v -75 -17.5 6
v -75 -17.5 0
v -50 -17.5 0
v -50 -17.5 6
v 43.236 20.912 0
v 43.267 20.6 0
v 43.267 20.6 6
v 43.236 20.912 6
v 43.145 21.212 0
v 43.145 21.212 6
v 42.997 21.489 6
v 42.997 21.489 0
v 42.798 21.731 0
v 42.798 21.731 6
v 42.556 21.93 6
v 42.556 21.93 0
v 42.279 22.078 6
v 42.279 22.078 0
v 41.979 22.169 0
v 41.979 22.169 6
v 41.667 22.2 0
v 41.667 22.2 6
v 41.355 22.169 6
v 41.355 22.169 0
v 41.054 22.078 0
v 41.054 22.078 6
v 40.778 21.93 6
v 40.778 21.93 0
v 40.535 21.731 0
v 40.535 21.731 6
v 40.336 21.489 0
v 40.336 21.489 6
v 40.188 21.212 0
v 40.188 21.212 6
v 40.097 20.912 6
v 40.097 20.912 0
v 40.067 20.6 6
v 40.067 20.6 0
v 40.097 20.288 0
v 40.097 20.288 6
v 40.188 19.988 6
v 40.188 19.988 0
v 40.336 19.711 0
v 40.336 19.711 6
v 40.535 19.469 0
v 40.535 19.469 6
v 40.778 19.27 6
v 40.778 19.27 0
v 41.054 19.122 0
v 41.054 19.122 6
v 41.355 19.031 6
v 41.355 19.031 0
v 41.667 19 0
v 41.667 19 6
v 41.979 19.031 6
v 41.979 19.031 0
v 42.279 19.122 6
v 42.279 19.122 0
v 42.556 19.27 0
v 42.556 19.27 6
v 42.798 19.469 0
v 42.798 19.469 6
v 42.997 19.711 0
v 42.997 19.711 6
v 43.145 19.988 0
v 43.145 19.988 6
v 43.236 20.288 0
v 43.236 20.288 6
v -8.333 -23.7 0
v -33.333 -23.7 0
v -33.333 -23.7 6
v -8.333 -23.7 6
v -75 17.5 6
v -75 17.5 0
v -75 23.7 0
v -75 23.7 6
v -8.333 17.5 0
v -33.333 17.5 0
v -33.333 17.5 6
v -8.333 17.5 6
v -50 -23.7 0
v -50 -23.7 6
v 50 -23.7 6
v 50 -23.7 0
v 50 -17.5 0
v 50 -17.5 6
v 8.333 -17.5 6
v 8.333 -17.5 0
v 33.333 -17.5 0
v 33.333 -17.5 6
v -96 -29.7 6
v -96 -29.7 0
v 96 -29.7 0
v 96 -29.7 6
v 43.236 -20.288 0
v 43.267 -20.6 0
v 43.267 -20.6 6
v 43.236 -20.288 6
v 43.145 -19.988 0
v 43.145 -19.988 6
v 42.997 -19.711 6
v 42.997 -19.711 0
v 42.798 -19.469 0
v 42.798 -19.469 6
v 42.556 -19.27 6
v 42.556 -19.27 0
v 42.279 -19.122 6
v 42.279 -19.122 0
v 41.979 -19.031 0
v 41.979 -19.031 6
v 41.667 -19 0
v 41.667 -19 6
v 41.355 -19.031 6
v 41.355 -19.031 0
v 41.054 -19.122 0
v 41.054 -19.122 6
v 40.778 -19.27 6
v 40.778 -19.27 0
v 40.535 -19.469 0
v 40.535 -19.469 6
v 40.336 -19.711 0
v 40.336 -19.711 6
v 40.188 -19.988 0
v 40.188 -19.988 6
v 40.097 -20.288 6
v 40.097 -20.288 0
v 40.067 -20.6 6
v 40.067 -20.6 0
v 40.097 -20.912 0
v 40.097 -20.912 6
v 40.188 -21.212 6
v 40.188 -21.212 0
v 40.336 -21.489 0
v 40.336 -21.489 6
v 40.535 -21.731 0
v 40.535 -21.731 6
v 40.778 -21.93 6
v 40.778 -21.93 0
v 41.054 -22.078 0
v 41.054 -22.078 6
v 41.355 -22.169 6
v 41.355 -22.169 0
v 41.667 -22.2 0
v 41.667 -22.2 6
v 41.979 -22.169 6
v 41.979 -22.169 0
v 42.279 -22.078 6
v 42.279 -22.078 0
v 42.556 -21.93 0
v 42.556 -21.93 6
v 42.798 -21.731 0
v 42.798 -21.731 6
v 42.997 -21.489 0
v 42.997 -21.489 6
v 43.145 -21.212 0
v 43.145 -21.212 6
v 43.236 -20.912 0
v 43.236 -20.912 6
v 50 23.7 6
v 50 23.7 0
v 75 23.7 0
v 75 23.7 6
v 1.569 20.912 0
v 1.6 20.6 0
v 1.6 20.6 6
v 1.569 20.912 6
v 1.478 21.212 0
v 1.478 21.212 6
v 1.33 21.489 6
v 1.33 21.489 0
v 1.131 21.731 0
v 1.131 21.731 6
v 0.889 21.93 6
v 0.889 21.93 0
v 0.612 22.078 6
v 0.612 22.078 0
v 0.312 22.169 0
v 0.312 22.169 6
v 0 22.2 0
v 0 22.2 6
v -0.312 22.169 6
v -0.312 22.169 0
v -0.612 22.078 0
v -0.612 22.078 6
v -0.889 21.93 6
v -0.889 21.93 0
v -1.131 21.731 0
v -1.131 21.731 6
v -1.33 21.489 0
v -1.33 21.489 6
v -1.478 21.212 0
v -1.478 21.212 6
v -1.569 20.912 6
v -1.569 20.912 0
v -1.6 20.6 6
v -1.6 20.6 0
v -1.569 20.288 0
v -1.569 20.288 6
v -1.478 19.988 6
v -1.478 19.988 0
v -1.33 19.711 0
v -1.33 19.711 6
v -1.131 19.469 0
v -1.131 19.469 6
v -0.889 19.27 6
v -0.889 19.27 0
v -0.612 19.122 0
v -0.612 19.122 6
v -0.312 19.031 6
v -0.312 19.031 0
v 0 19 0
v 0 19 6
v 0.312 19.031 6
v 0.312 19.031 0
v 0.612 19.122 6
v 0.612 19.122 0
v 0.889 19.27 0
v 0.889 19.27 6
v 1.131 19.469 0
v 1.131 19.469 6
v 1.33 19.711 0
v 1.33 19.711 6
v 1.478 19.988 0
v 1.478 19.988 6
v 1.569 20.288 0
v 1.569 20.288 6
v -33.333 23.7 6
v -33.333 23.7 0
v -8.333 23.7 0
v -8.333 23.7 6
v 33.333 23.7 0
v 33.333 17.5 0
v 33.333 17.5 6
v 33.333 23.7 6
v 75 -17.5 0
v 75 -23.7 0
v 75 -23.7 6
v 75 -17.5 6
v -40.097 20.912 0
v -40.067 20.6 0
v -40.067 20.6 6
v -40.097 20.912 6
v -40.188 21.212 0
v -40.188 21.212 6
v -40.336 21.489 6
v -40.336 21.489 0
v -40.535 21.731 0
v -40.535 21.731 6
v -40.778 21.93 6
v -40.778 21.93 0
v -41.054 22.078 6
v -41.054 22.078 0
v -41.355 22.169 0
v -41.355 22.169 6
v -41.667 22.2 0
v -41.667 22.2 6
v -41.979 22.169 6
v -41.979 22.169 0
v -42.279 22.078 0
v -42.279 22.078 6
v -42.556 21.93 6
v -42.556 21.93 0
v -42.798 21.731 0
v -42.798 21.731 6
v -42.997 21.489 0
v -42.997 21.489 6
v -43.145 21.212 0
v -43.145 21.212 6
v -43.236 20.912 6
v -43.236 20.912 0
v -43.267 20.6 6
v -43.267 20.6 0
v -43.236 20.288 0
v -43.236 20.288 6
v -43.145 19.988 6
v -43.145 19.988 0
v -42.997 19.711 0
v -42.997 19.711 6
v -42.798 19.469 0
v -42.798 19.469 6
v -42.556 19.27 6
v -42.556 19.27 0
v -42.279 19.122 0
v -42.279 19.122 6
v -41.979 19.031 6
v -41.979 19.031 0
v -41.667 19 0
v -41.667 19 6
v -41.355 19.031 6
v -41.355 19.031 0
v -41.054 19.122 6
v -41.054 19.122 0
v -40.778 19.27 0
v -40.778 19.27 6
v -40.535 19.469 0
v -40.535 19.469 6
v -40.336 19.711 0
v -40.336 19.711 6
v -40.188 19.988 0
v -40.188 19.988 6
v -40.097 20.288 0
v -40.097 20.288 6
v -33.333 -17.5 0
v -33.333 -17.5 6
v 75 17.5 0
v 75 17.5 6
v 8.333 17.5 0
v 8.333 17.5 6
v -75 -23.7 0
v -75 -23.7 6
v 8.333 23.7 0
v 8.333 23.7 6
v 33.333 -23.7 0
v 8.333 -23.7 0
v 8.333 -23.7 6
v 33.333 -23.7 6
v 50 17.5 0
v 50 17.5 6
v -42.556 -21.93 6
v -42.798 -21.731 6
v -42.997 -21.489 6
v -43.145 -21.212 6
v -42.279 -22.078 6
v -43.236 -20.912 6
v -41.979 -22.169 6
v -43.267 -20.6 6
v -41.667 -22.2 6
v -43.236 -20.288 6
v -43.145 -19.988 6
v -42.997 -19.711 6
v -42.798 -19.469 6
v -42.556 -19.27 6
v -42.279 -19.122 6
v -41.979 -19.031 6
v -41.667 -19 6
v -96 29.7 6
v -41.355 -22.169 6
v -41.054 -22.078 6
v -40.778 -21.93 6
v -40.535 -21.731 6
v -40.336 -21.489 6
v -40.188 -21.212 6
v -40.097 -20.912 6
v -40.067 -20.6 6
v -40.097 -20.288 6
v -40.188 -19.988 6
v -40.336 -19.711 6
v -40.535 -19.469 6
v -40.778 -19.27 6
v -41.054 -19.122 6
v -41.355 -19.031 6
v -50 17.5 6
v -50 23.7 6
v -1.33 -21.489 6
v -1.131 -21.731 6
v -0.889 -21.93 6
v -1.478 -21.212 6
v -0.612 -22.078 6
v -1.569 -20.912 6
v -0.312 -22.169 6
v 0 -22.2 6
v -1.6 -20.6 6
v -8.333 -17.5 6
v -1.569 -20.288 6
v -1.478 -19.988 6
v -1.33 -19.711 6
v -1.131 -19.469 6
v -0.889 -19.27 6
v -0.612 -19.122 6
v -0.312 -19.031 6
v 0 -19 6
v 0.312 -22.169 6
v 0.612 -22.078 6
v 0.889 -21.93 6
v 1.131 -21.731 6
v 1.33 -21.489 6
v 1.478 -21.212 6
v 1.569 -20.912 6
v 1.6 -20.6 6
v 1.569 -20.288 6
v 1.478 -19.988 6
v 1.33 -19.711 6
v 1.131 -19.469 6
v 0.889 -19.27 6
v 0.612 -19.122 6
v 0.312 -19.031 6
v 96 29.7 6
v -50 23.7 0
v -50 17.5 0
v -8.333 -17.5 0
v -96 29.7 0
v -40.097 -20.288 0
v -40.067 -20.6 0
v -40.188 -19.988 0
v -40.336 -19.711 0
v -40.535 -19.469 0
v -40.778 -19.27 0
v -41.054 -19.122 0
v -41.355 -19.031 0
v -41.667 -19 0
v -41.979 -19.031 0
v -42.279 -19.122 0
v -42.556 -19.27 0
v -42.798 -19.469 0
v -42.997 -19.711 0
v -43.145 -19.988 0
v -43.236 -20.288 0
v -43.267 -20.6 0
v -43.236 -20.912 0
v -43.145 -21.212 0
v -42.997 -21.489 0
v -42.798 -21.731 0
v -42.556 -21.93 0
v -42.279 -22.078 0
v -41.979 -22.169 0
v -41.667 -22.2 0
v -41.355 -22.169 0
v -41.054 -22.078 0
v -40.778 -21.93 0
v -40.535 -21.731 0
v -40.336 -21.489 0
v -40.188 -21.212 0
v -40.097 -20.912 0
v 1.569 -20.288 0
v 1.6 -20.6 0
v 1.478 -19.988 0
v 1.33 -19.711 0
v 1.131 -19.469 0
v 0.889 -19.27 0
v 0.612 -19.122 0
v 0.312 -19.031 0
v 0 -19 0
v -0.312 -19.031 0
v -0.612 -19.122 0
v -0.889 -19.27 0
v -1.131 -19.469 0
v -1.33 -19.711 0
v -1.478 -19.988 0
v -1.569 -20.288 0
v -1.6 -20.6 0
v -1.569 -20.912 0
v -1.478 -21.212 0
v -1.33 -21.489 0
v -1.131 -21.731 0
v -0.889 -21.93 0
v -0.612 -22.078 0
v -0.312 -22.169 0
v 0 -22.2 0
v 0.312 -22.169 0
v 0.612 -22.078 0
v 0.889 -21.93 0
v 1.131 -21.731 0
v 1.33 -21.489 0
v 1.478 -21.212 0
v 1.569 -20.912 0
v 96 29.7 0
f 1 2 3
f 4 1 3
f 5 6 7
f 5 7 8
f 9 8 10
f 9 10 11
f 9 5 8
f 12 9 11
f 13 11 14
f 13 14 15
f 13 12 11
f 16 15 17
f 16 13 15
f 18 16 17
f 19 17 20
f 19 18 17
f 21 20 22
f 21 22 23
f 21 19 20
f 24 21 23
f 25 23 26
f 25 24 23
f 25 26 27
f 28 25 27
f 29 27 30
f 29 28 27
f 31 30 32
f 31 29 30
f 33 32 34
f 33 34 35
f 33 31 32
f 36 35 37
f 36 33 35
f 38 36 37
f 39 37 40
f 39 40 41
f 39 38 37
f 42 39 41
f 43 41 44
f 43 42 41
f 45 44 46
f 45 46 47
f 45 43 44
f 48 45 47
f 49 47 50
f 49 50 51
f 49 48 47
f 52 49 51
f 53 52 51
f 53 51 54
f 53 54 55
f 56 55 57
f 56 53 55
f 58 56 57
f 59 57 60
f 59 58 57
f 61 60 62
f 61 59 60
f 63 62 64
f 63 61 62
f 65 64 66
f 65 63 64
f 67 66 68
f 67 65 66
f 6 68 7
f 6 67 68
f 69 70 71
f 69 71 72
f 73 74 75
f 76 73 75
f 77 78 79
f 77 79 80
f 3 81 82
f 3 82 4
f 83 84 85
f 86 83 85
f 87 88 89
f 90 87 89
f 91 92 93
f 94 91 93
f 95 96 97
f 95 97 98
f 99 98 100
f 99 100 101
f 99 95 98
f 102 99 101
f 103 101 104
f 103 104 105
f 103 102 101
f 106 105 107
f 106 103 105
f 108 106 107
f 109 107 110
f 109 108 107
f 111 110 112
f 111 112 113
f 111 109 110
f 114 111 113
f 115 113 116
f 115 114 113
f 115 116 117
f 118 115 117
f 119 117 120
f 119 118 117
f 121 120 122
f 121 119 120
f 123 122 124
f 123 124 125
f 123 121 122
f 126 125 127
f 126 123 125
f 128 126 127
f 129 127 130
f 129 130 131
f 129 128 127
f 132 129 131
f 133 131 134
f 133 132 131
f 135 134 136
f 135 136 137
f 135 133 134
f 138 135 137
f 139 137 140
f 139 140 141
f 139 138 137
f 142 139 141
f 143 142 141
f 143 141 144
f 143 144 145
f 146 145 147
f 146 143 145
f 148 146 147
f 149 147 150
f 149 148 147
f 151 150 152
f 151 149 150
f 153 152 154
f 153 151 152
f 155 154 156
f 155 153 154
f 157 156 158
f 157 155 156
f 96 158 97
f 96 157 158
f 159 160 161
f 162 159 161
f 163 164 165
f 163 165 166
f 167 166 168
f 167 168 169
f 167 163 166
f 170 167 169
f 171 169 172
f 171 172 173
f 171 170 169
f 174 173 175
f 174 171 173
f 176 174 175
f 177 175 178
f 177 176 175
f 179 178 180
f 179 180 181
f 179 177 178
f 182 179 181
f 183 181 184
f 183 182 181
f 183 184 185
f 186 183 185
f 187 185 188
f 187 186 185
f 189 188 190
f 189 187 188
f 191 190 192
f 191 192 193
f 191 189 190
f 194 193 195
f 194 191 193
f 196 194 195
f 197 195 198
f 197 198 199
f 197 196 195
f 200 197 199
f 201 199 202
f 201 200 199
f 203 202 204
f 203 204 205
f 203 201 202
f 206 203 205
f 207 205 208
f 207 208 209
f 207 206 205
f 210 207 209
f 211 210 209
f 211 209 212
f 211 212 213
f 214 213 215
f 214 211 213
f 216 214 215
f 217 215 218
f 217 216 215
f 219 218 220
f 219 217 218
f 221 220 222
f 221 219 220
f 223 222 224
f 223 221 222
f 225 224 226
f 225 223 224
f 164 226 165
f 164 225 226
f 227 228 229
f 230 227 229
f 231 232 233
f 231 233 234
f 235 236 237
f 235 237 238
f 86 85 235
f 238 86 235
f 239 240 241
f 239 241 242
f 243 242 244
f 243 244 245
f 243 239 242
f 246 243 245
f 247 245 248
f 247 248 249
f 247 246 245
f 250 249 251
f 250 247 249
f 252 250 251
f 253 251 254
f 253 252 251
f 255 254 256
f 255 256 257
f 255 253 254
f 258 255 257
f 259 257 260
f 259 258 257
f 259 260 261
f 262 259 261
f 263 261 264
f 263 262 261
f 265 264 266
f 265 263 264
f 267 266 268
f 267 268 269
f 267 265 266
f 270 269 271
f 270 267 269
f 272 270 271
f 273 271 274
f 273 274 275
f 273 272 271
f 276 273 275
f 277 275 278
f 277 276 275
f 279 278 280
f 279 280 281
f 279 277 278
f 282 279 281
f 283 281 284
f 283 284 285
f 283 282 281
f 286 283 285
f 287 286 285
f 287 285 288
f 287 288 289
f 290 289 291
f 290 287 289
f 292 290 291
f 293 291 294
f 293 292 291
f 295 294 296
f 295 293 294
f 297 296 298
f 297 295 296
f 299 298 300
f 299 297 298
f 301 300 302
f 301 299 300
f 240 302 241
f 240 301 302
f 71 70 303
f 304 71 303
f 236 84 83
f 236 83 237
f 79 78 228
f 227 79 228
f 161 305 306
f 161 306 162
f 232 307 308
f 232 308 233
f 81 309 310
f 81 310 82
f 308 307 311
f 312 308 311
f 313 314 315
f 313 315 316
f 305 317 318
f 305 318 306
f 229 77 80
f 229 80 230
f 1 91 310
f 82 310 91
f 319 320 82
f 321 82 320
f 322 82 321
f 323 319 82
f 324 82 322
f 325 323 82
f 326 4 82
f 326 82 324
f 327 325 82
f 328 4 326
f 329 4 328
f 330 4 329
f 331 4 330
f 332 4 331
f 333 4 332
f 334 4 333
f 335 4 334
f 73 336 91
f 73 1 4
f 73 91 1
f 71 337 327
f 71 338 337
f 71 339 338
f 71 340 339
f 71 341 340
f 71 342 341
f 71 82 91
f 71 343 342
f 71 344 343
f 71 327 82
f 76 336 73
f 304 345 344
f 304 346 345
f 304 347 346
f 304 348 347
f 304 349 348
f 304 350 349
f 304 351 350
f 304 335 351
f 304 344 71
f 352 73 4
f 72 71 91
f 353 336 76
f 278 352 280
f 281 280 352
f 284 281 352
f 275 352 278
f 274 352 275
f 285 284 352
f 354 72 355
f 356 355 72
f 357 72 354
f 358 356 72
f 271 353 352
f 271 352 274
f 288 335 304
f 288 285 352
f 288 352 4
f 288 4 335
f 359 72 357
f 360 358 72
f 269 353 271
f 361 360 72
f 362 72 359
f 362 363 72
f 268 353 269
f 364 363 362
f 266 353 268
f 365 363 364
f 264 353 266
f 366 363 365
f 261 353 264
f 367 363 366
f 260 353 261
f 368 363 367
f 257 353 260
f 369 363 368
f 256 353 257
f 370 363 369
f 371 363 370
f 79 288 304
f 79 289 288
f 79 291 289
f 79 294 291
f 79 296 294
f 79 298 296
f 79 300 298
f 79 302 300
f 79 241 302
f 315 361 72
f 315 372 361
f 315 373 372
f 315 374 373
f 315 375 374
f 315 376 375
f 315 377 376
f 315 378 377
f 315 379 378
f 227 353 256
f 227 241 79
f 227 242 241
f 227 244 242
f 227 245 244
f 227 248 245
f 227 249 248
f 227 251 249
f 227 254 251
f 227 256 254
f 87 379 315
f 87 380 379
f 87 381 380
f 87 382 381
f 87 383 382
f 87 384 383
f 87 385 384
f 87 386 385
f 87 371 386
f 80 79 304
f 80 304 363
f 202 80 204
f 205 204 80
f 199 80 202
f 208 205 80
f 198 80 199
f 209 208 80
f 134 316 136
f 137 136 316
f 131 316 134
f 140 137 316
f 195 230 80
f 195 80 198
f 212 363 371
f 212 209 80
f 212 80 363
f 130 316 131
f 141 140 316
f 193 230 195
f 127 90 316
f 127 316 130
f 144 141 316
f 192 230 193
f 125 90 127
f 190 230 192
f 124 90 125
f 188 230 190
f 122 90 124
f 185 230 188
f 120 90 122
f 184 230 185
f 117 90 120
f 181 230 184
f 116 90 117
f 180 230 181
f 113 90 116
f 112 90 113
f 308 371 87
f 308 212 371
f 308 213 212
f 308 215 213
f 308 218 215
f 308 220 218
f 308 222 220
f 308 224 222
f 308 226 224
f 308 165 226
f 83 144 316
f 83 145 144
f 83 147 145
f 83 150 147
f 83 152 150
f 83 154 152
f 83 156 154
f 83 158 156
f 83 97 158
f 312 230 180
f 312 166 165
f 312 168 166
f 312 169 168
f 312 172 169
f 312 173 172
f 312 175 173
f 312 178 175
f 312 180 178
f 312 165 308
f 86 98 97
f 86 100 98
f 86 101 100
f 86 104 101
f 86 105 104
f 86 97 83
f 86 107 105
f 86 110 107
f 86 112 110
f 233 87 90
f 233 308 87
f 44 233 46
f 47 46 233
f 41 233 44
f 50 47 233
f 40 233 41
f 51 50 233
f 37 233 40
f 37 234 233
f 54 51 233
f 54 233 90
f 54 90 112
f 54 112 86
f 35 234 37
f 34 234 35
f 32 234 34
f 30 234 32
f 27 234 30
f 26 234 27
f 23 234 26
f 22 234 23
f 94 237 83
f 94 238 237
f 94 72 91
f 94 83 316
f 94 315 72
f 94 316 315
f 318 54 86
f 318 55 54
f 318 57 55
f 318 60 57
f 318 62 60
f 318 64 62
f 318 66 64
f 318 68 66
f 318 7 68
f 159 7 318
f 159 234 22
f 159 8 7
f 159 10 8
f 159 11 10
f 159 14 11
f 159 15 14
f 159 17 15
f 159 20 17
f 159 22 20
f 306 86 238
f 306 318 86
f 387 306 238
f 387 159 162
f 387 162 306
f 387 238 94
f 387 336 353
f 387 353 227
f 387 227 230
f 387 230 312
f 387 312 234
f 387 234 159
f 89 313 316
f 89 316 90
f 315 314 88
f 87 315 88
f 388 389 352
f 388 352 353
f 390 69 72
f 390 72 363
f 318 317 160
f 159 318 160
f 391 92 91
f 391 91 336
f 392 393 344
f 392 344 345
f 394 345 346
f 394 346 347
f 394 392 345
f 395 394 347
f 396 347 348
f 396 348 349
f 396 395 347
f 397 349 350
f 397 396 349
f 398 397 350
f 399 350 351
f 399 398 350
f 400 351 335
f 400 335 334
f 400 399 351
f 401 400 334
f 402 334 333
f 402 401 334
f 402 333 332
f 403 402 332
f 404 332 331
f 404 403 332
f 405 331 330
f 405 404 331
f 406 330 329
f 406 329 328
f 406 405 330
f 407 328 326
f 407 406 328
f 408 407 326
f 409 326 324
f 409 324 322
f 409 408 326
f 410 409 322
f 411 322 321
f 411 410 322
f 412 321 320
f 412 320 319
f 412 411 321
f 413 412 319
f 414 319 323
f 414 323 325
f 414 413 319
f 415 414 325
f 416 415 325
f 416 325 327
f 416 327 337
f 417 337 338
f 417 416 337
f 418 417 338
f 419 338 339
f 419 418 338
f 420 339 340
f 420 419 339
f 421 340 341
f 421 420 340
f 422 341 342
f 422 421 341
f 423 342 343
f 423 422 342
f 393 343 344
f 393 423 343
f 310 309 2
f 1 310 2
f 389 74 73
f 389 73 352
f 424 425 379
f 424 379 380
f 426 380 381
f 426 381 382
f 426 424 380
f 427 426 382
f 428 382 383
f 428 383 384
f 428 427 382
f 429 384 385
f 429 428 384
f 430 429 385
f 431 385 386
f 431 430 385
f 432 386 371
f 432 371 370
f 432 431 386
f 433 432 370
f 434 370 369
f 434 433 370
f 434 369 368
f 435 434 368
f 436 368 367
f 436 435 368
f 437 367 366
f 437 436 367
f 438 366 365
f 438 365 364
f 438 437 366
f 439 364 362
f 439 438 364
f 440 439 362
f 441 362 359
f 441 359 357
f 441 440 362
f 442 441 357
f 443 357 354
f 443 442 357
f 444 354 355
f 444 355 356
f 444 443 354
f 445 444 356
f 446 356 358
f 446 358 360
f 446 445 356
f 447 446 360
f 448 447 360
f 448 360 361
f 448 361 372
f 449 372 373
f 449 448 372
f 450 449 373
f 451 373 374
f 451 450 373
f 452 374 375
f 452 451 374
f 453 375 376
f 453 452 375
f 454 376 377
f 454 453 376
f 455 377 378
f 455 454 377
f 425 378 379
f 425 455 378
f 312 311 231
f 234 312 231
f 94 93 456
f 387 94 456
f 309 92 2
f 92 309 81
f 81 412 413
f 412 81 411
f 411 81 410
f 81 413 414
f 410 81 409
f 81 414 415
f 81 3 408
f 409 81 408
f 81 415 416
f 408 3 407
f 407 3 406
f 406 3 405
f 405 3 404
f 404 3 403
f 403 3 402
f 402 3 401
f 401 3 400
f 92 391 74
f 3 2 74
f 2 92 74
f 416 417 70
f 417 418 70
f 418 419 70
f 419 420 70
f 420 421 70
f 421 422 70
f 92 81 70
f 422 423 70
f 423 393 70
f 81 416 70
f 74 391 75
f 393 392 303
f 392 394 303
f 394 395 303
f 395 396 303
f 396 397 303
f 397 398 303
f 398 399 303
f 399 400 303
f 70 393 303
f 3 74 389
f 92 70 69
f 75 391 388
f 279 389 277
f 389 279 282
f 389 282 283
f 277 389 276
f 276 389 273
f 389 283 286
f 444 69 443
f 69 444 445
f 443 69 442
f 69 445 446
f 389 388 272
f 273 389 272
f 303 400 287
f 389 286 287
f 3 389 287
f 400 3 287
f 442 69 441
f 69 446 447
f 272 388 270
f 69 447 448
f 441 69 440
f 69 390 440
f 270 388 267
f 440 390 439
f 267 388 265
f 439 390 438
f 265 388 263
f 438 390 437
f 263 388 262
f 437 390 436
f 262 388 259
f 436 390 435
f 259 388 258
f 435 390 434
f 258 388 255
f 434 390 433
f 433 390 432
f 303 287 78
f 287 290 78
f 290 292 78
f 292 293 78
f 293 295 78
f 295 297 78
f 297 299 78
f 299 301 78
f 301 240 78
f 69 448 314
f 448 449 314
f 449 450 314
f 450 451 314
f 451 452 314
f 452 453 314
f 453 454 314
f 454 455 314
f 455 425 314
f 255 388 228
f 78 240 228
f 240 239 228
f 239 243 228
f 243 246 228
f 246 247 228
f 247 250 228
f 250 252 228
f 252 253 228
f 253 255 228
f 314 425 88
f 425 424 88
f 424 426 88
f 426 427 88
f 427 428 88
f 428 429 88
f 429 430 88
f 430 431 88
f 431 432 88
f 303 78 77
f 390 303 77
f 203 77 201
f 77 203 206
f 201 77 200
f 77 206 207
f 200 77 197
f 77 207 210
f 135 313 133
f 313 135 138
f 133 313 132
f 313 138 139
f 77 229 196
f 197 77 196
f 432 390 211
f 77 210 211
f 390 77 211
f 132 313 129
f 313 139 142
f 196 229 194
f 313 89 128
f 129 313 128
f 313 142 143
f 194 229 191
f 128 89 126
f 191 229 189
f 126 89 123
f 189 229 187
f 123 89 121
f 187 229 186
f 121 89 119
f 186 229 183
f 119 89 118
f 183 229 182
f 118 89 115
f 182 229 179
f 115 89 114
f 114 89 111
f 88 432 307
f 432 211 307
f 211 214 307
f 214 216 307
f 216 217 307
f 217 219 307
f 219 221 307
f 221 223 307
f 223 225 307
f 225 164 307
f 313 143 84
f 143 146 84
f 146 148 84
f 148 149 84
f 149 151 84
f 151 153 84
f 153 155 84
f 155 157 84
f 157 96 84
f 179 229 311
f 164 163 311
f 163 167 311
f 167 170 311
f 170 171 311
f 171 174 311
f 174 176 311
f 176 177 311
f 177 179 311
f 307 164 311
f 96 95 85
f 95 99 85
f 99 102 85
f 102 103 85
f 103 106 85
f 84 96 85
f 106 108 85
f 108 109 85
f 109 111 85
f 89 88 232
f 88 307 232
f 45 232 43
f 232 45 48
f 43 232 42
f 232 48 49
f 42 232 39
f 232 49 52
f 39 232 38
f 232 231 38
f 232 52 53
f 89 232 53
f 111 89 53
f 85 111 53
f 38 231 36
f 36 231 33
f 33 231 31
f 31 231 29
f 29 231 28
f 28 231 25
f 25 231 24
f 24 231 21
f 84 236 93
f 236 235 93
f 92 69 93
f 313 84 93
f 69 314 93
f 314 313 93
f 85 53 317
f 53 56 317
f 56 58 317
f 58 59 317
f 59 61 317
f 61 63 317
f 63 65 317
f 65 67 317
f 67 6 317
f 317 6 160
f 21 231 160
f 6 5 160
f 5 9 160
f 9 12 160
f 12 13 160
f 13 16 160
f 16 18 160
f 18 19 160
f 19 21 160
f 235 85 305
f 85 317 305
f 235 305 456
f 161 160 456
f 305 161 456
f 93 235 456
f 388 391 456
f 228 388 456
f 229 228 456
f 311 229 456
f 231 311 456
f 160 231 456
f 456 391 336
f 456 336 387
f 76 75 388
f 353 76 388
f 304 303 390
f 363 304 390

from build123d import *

# Parameters (mm, degrees)
SKETCH1_W           = 192
SKETCH1_H           = 59.4
SKETCH1_R           = 1.6
SKETCH1_W_2         = 25
SKETCH1_H_2         = 6.2
BOSS_EXTRUDE1_DEPTH = 6


with BuildPart() as part:
    # Sketch1 → Boss-Extrude1 (new body)
    with BuildSketch(Plane.XY):
        Rectangle(SKETCH1_W, SKETCH1_H)
        with Locations((-41.666666667, -20.6)):
            Circle(SKETCH1_R, mode=Mode.SUBTRACT)
        with Locations((0, -20.6)):
            Circle(SKETCH1_R, mode=Mode.SUBTRACT)
        with Locations((41.666666667, -20.6)):
            Circle(SKETCH1_R, mode=Mode.SUBTRACT)
        with Locations((0, 20.6)):
            Circle(SKETCH1_R, mode=Mode.SUBTRACT)
        with Locations((41.666666667, 20.6)):
            Circle(SKETCH1_R, mode=Mode.SUBTRACT)
        with Locations((-41.666666667, 20.6)):
            Circle(SKETCH1_R, mode=Mode.SUBTRACT)
        with Locations((-20.833333333, -20.6)):
            Rectangle(SKETCH1_W_2, SKETCH1_H_2, mode=Mode.SUBTRACT)
        with Locations((-62.5, -20.6)):
            Rectangle(SKETCH1_W_2, SKETCH1_H_2, mode=Mode.SUBTRACT)
        with Locations((20.833333333, -20.6)):
            Rectangle(SKETCH1_W_2, SKETCH1_H_2, mode=Mode.SUBTRACT)
        with Locations((62.5, -20.6)):
            Rectangle(SKETCH1_W_2, SKETCH1_H_2, mode=Mode.SUBTRACT)
        with Locations((-62.5, 20.6)):
            Rectangle(SKETCH1_W_2, SKETCH1_H_2, mode=Mode.SUBTRACT)
        with Locations((-20.833333333, 20.6)):
            Rectangle(SKETCH1_W_2, SKETCH1_H_2, mode=Mode.SUBTRACT)
        with Locations((20.833333333, 20.6)):
            Rectangle(SKETCH1_W_2, SKETCH1_H_2, mode=Mode.SUBTRACT)
        with Locations((62.5, 20.6)):
            Rectangle(SKETCH1_W_2, SKETCH1_H_2, mode=Mode.SUBTRACT)
    extrude(amount=BOSS_EXTRUDE1_DEPTH)


solid = part.part
